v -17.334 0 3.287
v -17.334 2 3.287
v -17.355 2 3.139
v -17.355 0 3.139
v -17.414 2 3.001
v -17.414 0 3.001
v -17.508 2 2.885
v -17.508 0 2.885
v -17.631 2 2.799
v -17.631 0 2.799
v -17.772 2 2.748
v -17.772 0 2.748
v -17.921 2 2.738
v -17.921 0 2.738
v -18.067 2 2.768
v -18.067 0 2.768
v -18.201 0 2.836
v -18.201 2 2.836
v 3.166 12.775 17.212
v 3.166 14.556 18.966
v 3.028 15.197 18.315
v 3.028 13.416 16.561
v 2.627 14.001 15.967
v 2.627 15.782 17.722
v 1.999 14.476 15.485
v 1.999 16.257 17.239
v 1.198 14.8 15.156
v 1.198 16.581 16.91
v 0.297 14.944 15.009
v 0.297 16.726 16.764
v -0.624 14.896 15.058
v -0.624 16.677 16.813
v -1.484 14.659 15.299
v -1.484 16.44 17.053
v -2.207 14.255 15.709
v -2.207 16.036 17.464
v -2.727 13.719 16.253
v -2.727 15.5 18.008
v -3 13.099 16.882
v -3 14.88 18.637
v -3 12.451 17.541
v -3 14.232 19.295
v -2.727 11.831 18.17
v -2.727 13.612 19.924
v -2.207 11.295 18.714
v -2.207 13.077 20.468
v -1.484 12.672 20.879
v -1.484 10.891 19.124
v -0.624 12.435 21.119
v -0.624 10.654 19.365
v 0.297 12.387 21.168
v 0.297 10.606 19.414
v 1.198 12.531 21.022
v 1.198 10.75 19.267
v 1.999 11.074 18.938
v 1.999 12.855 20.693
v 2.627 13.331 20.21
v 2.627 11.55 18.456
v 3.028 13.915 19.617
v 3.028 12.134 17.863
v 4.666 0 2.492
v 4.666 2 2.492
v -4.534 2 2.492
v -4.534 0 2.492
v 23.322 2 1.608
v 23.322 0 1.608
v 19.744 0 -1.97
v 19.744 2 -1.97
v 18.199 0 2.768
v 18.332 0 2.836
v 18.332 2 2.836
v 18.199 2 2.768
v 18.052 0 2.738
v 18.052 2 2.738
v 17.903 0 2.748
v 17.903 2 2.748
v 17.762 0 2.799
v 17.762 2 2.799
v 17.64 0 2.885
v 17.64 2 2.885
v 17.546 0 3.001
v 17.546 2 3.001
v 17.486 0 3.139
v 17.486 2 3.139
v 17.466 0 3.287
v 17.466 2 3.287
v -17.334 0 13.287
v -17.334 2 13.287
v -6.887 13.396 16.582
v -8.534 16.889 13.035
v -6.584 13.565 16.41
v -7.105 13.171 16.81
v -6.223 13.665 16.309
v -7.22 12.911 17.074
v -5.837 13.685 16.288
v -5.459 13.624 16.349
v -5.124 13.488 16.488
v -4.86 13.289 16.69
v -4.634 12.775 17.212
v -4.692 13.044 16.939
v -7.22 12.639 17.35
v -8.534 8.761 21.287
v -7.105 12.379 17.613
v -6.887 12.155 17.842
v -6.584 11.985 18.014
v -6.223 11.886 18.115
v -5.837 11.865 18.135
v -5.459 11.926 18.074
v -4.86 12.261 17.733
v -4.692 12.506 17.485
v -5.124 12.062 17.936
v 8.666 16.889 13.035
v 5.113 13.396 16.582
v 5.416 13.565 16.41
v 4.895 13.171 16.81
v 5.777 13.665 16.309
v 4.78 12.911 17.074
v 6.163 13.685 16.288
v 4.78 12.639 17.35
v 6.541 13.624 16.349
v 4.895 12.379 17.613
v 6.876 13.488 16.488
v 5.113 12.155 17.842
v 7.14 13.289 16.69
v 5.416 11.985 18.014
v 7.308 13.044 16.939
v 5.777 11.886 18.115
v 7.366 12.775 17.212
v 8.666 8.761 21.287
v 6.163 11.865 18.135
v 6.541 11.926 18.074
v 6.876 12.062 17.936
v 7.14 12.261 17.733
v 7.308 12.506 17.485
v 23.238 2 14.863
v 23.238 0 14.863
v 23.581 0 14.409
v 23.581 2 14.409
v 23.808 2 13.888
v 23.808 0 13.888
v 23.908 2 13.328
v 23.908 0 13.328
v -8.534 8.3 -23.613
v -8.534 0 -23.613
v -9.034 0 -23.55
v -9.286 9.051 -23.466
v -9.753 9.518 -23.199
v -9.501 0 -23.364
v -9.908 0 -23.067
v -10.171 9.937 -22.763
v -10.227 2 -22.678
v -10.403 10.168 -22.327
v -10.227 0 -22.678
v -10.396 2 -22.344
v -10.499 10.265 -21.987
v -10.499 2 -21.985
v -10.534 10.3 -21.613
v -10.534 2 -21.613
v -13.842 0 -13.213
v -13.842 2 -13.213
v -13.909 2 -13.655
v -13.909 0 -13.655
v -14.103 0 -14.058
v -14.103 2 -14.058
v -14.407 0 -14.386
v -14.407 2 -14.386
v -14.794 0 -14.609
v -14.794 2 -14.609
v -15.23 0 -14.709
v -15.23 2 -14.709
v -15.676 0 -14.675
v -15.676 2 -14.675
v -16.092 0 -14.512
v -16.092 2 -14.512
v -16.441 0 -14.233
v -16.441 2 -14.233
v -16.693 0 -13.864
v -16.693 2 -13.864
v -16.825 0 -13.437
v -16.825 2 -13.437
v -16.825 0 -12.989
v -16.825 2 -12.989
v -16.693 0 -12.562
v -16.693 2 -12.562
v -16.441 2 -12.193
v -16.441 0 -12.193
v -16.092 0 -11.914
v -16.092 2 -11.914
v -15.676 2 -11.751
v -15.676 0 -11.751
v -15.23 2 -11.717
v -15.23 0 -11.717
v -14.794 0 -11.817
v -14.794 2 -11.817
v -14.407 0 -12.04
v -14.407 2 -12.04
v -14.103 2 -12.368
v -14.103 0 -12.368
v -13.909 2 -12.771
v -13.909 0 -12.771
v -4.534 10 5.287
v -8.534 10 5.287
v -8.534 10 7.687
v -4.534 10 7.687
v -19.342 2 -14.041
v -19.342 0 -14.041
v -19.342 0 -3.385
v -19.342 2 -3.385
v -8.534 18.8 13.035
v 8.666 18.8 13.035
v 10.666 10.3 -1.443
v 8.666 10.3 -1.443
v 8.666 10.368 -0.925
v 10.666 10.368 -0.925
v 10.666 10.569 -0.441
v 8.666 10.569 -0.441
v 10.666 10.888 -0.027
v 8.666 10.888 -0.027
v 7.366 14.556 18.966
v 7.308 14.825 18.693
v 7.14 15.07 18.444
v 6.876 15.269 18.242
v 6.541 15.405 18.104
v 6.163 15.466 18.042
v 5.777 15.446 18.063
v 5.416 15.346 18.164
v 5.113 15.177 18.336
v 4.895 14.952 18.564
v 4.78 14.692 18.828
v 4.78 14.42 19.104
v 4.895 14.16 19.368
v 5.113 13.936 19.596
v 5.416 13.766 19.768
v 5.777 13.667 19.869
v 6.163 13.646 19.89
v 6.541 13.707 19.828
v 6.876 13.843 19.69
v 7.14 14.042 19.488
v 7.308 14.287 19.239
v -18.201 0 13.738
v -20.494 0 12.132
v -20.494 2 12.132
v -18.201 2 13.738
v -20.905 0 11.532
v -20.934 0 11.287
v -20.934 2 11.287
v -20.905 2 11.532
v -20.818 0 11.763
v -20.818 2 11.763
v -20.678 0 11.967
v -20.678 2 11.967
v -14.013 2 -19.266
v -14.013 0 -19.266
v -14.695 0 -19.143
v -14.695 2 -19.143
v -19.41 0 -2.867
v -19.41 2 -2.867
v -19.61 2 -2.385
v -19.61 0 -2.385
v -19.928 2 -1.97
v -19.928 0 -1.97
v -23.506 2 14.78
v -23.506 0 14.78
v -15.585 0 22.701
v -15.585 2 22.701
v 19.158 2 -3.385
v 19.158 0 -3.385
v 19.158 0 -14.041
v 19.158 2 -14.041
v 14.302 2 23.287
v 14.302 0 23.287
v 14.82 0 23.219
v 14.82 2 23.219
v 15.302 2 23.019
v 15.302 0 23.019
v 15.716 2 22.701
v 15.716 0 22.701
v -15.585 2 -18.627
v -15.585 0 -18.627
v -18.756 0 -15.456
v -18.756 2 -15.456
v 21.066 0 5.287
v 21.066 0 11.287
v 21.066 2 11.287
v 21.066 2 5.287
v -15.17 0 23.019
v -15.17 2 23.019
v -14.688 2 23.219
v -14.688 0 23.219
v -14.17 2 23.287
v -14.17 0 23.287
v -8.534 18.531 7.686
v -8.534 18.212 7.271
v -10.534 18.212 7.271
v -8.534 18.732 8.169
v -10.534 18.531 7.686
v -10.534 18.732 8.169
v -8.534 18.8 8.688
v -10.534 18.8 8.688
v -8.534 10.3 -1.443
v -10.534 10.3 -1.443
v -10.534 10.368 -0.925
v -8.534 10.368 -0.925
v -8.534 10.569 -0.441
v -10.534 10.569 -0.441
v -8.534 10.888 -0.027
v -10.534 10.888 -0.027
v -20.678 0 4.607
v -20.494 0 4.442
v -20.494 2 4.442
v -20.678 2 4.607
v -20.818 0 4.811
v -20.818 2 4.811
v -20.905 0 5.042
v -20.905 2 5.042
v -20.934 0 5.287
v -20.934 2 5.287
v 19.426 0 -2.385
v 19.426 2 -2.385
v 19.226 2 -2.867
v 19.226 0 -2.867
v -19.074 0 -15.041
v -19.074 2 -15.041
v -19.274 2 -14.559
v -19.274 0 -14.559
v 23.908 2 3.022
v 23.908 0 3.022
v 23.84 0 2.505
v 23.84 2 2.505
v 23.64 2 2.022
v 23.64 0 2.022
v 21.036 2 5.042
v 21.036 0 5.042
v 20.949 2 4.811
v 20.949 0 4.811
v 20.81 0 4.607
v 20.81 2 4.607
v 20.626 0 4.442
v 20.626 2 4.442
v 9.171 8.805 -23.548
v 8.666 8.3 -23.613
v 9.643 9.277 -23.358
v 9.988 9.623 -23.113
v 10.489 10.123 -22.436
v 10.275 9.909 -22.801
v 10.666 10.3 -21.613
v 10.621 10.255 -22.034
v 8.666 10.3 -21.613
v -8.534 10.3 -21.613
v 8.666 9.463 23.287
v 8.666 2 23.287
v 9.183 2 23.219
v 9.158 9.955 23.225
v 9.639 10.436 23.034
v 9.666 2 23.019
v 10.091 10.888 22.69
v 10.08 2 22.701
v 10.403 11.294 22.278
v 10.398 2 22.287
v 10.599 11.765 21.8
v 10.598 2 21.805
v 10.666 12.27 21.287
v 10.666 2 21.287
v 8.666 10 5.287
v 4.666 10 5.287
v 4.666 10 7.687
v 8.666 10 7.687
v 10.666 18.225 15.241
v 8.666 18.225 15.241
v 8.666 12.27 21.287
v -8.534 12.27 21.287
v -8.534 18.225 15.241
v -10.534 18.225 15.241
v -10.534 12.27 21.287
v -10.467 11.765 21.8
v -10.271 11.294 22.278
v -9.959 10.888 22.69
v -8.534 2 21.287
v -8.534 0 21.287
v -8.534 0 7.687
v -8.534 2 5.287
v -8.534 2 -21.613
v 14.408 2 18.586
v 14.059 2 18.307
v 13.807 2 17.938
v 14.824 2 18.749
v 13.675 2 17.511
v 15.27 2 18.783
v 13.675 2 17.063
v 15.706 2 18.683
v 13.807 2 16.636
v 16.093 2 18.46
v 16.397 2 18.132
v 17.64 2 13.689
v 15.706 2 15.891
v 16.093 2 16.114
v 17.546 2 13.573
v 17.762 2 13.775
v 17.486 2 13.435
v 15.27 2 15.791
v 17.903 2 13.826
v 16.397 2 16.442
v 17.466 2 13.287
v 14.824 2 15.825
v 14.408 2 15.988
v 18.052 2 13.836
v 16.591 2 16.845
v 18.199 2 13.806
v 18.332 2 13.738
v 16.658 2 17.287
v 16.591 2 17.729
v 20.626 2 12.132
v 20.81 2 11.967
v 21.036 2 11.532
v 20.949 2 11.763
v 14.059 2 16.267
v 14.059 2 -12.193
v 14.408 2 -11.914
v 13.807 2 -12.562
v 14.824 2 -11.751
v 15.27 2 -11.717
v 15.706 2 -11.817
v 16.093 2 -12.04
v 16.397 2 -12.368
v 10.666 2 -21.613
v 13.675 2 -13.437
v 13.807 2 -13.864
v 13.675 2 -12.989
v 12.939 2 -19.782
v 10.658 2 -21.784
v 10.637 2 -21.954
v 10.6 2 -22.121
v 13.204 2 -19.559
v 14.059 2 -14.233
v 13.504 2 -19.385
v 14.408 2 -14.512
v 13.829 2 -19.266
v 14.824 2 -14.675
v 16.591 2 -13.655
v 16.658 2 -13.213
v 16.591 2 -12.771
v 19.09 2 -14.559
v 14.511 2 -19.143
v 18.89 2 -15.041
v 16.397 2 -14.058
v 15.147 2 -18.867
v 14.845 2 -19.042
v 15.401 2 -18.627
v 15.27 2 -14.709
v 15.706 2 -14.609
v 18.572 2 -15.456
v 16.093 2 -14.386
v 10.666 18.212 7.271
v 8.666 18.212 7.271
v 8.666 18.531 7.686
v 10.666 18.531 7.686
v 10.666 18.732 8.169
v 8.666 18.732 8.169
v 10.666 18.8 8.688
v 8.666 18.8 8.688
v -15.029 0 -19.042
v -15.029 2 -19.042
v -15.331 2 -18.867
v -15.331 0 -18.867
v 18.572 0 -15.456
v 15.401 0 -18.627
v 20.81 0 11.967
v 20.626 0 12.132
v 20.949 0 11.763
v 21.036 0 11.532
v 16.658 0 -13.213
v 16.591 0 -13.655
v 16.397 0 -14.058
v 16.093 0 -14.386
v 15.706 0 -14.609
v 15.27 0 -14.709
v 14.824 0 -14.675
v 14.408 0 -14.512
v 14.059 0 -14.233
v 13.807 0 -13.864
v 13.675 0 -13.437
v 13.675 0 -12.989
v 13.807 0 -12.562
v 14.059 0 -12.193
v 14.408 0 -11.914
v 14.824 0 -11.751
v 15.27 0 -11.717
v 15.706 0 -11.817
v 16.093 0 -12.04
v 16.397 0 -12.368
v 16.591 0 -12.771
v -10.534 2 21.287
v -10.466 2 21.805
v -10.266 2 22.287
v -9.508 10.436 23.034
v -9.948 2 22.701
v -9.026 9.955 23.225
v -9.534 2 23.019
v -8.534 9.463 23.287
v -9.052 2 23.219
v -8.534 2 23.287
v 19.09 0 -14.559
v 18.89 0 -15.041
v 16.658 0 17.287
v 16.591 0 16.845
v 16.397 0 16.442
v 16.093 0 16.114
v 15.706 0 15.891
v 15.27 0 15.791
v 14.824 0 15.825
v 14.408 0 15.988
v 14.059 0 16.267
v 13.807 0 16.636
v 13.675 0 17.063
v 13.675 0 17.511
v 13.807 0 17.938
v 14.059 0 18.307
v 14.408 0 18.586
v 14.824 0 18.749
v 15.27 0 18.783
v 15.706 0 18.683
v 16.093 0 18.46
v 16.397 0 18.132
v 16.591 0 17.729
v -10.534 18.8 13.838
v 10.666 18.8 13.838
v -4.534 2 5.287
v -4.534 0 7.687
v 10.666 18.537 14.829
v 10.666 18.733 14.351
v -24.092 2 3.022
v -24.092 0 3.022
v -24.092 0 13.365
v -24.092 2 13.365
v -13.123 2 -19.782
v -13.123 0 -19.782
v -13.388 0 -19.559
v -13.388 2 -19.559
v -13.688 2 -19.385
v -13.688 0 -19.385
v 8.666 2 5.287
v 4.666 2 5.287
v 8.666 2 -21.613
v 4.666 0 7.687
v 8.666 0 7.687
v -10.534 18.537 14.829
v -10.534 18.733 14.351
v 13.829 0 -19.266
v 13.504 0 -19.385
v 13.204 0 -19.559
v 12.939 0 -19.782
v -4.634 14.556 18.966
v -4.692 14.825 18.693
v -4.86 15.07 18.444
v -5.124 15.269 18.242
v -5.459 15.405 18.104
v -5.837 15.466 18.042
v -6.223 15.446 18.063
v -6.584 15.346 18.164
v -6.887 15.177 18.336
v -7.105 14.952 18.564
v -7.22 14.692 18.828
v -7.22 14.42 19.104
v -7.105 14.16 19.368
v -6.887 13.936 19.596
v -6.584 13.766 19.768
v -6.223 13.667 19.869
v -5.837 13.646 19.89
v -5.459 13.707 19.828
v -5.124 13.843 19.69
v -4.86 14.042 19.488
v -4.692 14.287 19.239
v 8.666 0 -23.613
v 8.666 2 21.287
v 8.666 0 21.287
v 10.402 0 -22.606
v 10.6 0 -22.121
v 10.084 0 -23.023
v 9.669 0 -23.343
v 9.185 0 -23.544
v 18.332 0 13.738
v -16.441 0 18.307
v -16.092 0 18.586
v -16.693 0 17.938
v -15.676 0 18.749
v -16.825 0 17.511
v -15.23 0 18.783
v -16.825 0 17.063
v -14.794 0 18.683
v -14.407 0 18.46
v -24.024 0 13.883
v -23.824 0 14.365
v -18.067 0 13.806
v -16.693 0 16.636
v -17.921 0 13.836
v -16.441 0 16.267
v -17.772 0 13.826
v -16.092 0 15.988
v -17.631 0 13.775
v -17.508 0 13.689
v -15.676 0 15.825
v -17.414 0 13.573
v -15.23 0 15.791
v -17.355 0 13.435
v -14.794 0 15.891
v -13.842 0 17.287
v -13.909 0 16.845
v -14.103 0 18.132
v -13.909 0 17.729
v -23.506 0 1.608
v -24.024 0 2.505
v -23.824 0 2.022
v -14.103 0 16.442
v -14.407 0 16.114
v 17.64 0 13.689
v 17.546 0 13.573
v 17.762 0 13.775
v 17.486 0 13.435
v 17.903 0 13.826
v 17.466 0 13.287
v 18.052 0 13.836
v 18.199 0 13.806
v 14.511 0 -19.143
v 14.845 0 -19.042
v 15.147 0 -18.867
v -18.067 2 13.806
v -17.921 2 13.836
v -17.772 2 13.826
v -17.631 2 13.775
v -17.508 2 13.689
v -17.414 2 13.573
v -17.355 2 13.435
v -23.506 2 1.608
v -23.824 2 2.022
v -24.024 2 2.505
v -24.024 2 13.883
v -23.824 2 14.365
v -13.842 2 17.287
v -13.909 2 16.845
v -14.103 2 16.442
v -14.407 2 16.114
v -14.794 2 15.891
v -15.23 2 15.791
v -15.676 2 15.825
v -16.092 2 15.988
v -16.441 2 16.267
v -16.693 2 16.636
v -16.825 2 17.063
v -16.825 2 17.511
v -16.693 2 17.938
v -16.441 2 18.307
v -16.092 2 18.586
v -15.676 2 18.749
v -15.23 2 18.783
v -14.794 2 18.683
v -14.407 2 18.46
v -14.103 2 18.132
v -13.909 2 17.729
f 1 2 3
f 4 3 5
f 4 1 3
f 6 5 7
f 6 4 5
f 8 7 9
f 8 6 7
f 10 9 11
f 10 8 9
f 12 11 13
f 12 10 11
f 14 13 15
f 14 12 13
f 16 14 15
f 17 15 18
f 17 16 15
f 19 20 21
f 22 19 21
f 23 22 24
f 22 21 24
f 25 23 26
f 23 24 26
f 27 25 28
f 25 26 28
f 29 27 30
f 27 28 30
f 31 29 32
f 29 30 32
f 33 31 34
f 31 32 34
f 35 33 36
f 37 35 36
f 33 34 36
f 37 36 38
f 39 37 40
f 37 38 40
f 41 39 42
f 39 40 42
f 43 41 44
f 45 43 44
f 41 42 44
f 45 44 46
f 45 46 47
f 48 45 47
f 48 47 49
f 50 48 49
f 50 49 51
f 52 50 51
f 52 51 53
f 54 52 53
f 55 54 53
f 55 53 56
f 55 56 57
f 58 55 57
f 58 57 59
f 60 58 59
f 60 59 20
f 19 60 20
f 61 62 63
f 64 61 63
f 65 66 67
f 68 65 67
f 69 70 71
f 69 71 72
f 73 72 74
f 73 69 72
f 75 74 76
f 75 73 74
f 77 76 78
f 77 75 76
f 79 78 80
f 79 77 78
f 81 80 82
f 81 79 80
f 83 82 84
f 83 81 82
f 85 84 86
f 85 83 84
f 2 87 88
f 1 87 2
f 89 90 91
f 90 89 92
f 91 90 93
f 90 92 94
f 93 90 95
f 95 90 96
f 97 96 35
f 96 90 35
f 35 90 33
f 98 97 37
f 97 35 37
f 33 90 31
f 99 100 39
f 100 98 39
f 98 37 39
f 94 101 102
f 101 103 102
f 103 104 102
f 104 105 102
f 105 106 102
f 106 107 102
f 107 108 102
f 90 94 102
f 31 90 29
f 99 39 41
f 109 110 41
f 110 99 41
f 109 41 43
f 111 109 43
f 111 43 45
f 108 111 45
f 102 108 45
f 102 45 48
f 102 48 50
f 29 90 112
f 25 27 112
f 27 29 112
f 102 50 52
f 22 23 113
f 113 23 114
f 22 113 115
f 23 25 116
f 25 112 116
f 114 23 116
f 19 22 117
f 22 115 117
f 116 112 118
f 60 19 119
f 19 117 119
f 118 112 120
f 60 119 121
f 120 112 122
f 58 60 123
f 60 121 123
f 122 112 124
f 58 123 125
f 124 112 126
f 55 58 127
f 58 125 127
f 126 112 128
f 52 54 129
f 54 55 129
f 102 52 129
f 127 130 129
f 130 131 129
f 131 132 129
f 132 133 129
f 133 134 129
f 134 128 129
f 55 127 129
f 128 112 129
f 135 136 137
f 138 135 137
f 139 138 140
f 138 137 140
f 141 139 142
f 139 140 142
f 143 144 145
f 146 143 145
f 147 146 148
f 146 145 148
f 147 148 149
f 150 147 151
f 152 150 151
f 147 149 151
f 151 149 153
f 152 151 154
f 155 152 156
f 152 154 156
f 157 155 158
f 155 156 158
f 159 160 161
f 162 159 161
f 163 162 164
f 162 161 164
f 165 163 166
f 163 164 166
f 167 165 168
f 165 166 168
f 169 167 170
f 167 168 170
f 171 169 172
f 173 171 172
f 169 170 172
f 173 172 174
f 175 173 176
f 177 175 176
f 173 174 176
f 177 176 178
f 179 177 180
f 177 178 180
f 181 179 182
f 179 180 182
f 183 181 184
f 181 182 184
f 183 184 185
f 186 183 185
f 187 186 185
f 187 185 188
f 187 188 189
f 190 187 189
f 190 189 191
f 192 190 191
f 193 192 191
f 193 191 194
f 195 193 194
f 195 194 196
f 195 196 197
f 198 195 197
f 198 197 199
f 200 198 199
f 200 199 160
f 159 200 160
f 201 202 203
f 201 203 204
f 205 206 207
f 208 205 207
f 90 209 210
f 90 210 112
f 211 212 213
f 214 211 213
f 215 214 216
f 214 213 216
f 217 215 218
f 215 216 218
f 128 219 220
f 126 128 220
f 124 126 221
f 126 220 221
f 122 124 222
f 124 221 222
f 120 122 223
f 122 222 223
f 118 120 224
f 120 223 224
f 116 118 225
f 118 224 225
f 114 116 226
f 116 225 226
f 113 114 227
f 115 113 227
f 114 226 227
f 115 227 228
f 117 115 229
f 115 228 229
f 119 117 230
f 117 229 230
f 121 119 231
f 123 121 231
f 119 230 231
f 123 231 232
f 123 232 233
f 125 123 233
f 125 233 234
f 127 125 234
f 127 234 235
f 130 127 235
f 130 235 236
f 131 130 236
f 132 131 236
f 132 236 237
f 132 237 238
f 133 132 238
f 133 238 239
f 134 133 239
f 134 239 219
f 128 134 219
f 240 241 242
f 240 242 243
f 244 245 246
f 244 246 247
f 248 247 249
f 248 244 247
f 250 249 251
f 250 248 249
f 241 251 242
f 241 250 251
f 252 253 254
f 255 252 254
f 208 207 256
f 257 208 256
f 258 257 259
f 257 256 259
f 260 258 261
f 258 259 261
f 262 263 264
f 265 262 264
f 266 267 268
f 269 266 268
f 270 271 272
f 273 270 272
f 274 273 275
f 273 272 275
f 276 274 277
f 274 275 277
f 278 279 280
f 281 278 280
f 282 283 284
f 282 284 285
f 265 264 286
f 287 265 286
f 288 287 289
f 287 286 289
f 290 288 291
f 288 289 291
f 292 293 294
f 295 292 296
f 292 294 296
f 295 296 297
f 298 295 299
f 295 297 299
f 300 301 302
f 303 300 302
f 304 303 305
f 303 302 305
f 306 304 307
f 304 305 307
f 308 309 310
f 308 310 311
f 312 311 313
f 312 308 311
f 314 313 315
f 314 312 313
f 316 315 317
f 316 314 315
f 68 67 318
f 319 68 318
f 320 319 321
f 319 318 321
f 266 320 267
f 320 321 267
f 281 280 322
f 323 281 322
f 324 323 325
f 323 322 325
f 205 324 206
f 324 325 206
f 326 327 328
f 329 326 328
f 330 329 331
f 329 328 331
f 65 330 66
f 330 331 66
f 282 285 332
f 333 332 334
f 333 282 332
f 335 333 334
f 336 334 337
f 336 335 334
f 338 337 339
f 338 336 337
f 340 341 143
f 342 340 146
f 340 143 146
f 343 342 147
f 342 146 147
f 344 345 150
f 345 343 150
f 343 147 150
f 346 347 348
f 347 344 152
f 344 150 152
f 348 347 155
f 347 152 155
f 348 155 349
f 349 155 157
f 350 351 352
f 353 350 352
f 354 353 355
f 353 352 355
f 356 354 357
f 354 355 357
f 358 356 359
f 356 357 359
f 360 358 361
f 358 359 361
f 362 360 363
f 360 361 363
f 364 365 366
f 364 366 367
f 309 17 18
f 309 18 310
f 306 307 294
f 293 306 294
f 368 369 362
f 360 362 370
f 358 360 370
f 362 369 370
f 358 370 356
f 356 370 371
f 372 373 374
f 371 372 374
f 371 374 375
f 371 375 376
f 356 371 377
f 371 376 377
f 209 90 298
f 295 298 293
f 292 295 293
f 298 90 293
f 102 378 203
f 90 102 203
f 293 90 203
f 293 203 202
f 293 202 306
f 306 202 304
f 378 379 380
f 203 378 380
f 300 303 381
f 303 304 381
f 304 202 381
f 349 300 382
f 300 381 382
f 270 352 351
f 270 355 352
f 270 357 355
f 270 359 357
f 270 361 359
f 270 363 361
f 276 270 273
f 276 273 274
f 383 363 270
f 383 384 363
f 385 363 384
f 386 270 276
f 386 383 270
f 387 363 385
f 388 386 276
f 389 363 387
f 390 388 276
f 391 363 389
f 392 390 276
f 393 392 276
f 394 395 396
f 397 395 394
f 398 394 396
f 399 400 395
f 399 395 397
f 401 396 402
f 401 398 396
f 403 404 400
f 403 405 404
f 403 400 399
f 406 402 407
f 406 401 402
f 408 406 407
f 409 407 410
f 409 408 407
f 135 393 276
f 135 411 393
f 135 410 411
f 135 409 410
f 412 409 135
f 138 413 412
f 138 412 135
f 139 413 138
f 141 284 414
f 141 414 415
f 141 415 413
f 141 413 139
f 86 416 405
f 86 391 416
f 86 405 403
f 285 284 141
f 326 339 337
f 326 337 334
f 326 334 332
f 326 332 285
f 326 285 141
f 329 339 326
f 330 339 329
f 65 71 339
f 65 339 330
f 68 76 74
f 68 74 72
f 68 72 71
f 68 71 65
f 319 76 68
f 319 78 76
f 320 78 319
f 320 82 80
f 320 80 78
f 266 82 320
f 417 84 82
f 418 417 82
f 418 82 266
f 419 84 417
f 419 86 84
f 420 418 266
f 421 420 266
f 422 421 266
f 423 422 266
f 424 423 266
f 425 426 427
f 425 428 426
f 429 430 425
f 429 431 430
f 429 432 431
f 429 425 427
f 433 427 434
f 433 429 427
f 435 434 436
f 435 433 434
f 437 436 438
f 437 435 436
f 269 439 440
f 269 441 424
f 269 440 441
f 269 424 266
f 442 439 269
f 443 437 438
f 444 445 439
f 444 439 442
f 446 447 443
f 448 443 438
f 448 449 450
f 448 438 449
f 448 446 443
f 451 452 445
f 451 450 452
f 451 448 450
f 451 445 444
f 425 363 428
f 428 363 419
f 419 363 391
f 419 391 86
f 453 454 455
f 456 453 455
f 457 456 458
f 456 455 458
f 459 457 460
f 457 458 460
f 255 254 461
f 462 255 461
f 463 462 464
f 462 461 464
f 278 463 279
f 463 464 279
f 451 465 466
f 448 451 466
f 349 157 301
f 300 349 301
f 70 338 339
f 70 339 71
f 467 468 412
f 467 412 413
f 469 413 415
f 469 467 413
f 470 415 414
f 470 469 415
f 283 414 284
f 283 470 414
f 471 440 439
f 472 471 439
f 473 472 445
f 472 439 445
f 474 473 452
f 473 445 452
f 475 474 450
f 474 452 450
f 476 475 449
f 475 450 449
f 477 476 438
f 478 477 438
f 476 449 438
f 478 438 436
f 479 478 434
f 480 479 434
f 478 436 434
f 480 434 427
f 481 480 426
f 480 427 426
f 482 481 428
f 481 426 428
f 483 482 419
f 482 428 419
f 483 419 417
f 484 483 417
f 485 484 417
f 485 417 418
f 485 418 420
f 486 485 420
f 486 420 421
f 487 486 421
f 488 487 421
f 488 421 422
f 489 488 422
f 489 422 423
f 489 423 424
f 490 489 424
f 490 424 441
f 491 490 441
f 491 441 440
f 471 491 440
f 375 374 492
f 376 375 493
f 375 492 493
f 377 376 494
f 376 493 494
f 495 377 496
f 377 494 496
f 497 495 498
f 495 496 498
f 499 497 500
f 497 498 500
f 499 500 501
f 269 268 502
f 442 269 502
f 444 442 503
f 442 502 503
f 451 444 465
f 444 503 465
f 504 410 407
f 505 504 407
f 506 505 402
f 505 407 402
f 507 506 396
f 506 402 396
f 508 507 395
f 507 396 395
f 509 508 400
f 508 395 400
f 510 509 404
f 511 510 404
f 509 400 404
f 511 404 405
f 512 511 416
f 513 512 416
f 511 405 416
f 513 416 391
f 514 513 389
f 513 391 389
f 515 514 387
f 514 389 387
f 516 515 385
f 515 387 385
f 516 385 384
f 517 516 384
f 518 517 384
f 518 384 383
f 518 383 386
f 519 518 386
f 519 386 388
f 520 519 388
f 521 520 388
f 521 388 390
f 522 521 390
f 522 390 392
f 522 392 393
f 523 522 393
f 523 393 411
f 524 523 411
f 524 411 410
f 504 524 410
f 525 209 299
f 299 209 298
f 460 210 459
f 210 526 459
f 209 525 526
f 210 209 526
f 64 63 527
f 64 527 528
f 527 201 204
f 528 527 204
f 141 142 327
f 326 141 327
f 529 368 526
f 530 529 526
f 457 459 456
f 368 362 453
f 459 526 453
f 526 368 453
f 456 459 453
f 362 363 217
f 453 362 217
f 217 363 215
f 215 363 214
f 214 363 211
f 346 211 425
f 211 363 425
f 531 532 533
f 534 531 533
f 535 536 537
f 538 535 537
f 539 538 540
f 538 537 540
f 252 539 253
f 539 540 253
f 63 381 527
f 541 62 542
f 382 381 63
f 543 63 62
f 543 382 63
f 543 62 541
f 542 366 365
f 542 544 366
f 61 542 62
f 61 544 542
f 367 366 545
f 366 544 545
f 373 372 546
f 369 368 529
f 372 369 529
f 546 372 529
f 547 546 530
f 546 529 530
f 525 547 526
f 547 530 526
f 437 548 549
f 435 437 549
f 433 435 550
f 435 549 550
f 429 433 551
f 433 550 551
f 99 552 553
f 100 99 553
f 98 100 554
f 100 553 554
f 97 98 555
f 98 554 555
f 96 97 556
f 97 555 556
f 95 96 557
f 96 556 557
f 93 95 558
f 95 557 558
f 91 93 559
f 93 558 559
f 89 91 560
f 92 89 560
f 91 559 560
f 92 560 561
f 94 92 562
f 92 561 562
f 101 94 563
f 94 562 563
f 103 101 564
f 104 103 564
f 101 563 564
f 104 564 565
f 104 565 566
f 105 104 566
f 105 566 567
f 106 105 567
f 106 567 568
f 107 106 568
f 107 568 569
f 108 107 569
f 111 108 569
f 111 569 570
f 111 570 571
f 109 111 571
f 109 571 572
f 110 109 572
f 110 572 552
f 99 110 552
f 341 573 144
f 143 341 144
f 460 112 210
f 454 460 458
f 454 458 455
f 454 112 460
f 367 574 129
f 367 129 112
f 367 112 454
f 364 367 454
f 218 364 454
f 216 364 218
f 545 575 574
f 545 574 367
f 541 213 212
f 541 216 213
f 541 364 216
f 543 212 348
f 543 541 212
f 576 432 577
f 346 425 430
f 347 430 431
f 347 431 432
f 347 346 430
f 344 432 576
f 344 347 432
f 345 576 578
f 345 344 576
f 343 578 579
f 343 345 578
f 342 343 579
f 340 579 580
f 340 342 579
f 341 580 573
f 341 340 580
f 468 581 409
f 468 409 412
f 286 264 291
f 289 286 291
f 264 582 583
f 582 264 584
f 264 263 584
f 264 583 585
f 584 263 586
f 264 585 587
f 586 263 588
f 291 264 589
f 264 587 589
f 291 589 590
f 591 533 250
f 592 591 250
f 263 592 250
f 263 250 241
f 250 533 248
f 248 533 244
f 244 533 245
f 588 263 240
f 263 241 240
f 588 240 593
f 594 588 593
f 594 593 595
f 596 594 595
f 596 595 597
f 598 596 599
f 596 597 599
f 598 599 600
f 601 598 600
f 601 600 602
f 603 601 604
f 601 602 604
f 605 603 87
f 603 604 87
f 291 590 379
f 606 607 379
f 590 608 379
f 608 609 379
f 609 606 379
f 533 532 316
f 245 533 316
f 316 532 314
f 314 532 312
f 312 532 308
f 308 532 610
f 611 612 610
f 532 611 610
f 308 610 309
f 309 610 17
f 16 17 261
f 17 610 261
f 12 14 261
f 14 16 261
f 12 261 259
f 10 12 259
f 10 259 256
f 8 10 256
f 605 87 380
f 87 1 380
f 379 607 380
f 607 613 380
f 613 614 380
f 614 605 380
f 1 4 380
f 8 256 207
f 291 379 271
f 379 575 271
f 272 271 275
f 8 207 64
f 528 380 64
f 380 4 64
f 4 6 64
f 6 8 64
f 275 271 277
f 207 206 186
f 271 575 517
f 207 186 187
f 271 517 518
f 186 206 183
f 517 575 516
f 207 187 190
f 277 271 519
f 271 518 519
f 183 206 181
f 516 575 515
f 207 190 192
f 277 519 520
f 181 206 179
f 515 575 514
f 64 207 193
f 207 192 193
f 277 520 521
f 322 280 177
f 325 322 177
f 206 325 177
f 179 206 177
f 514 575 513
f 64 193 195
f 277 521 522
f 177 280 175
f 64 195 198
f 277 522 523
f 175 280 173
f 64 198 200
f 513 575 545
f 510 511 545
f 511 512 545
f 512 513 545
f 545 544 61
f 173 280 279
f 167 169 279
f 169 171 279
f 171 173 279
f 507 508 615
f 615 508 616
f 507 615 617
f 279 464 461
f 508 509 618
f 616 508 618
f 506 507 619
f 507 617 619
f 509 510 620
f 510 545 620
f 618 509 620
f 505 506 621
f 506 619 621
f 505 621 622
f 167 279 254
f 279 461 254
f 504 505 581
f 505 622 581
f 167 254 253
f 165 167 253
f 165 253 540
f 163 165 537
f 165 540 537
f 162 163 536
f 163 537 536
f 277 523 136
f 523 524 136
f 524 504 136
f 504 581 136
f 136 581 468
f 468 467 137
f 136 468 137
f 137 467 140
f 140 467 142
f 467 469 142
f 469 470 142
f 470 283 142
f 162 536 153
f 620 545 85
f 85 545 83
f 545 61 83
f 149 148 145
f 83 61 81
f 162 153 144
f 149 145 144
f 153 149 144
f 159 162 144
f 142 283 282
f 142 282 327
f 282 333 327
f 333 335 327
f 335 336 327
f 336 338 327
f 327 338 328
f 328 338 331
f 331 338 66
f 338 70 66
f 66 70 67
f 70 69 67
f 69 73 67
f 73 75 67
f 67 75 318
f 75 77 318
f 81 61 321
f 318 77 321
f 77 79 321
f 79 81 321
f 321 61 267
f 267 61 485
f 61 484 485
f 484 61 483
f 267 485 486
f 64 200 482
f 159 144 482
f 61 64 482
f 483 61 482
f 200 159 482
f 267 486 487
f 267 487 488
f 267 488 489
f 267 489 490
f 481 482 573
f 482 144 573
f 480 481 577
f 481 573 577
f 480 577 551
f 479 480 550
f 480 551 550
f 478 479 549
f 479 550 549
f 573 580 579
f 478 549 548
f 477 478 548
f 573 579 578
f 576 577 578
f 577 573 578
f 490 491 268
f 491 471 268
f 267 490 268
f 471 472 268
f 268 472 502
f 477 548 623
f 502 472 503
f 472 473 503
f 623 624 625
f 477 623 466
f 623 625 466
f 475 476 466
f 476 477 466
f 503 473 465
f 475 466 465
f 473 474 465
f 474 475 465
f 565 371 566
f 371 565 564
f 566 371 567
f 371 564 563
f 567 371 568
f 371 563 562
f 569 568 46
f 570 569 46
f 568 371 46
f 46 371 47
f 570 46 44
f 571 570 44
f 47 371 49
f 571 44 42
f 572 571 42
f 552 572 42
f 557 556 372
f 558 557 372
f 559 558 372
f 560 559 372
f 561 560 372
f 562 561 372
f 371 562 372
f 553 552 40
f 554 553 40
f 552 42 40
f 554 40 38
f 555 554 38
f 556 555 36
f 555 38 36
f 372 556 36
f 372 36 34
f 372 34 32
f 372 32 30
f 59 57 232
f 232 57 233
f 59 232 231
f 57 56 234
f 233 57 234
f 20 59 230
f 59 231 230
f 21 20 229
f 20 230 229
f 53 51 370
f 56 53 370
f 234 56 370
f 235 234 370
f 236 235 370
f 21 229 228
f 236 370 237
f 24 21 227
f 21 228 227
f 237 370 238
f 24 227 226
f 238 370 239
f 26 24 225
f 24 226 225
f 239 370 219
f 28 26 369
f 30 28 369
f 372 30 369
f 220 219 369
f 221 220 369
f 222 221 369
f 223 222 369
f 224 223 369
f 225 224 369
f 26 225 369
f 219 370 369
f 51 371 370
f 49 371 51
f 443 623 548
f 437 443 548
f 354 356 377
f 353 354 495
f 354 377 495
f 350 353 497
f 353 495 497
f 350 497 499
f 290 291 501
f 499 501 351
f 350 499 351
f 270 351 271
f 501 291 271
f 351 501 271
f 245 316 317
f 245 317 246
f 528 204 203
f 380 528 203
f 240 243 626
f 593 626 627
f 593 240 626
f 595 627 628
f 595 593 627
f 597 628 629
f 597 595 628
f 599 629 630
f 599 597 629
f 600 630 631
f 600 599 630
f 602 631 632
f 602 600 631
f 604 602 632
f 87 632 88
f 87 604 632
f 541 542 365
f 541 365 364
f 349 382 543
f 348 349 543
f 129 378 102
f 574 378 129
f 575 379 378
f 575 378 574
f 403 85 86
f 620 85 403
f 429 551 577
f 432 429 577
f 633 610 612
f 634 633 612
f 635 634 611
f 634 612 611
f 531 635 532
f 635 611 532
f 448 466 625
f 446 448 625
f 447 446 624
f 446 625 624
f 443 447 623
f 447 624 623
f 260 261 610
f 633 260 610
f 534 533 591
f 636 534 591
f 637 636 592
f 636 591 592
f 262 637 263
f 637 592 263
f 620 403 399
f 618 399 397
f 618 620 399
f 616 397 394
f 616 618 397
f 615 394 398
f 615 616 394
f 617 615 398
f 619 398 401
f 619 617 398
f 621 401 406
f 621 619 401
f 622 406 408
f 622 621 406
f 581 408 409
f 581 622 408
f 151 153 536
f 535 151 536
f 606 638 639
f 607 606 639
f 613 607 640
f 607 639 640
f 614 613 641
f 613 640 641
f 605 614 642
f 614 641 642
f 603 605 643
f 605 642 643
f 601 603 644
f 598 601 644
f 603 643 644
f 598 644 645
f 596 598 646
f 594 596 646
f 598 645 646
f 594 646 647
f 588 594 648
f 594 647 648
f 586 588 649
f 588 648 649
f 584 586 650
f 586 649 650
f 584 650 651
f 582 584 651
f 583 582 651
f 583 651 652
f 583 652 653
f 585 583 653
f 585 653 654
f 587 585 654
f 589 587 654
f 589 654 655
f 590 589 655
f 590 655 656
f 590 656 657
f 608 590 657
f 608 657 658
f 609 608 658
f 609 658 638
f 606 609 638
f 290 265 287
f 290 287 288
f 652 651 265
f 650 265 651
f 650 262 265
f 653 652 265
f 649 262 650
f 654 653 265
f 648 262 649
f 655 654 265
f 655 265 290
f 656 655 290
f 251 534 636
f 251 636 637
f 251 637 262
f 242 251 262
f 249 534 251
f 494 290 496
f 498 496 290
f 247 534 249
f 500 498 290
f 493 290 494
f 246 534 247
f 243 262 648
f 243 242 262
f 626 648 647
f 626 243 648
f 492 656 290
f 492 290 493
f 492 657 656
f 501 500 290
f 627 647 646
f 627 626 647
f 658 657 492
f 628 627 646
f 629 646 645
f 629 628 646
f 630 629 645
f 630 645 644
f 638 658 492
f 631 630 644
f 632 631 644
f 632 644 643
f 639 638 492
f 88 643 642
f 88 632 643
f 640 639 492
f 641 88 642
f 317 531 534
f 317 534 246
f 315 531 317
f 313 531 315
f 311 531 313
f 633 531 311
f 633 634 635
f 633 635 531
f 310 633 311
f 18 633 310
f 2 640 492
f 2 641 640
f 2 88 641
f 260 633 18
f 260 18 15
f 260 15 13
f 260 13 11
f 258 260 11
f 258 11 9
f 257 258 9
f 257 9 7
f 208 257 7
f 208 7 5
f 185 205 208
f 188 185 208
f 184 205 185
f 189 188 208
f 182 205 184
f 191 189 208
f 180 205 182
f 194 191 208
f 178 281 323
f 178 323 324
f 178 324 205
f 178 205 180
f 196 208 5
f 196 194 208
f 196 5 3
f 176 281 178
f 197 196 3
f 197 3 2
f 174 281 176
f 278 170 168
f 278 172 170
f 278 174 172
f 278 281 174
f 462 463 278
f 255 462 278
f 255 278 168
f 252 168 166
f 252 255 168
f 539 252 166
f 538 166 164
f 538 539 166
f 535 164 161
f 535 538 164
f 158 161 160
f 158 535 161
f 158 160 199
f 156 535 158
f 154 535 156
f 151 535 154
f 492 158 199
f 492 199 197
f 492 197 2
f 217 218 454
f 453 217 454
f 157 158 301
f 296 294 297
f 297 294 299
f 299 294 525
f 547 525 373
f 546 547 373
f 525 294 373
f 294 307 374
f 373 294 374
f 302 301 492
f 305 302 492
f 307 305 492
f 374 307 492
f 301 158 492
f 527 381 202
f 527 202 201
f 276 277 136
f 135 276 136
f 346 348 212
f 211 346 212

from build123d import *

# Parameters (mm, degrees)
BOSS_EXTRUDE1_DEPTH      = 2
SKETCH2_R                = 1.500000246
SKETCH2_R_2              = 1.5
CUT_EXTRUDE1_DEPTH       = 3
CUT_EXTRUDE3_DEPTH       = 3
SKETCH4_W                = 17.2
SKETCH4_H                = 42.900000423
BOSS_EXTRUDE2_DEPTH      = 16.8
BOSS_EXTRUDE2_DEPTH_BACK = 2
CUT_EXTRUDE4_DEPTH       = 35.442318281
BOSS_EXTRUDE3_REACH      = 34.758
CUT_EXTRUDE5_REACH       = 42.25
SKETCH7_R                = 3.1
SKETCH7_R_2              = 1.3
CUT_EXTRUDE6_REACH       = 4
SKETCH10_W               = 4
SKETCH10_H               = 2.4
BOSS_EXTRUDE4_DEPTH      = 8


with BuildPart() as part:
    # Sketch1 → Boss-Extrude1 (new body)
    with BuildSketch(Plane(origin=(0, 0, 0), x_dir=(1, 0, 0), z_dir=(0, 1, 0))):
        with BuildLine():
            Line((18.572356392, 15.455642083), (15.400781136, 18.627215476))
            ThreePointArc((15.400781136, 18.627215476), (15.000980559, 18.963075341), (14.510830812, 19.14306305))
            Line((14.510830812, 19.14306305), (13.829154841, 19.266075861))
            ThreePointArc((13.829154841, 19.266075861), (13.350450837, 19.465809152), (12.939209066, 19.781927984))
            Line((12.939209066, 19.781927984), (9.538270081, 23.182866969))
            ThreePointArc((9.538270081, 23.182866969), (9.061835297, 23.501210514), (8.499842151, 23.612997901))
            Line((8.499842151, 23.612997901), (-8.368205994, 23.612997901))
            ThreePointArc((-8.368205994, 23.612997901), (-9.221556491, 23.443255933), (-9.94499211, 22.959871707))
            Line((-9.94499211, 22.959871707), (-13.122935832, 19.781927984))
            ThreePointArc((-13.122935832, 19.781927984), (-13.53417801, 19.465808988), (-14.012882539, 19.266075861))
            Line((-14.012882539, 19.266075861), (-14.694557578, 19.14306305))
            ThreePointArc((-14.694557578, 19.14306305), (-15.184706626, 18.963073976), (-15.584504285, 18.627210927))
            Line((-15.584504285, 18.627210927), (-18.756076746, 15.455636602))
            ThreePointArc((-18.756076746, 15.455636602), (-19.189622668, 14.806788967), (-19.341863745, 14.041421099))
            Line((-19.341863745, 14.041421099), (-19.341863745, 3.384570997))
            ThreePointArc((-19.341863745, 3.384570997), (-19.494104434, 2.619205106), (-19.927649253, 1.970359158))
            Line((-19.927649253, 1.970359158), (-23.506077059, -1.608070511))
            ThreePointArc((-23.506077059, -1.608070511), (-23.939622981, -2.25691811), (-24.091864058, -3.022285948))
            Line((-24.091864058, -3.022285948), (-24.091864058, -13.36542942))
            ThreePointArc((-24.091864058, -13.36542942), (-23.939623268, -14.130795551), (-23.506078181, -14.779641628))
            Line((-23.506078181, -14.779641628), (-15.584504285, -22.701215524))
            ThreePointArc((-15.584504285, -22.701215524), (-14.935656966, -23.134761442), (-14.170289369, -23.287002522))
            Line((-14.170289369, -23.287002522), (14.301925526, -23.287002522))
            ThreePointArc((14.301925526, -23.287002522), (15.067293123, -23.134761442), (15.716140442, -22.701215524))
            Line((15.716140442, -22.701215524), (23.23794041, -14.862959876))
            ThreePointArc((23.23794041, -14.862959876), (23.709924747, -14.155388537), (23.90813636, -13.32826184))
            Line((23.90813636, -13.32826184), (23.90813636, -3.022286468))
            ThreePointArc((23.90813636, -3.022286468), (23.755895287, -2.25691839), (23.322349361, -1.608070511))
            Line((23.322349361, -1.608070511), (19.743924908, 1.970357668))
            ThreePointArc((19.743924908, 1.970357668), (19.310378982, 2.619205547), (19.158137909, 3.384573625))
            Line((19.158137909, 3.384573625), (19.158137909, 14.041440986))
            ThreePointArc((19.158137909, 14.041440986), (19.005898249, 14.806801151), (18.572356392, 15.455642083))
        make_face()
    extrude(amount=BOSS_EXTRUDE1_DEPTH)

    # Sketch2 → Cut-Extrude1 (cut, through all)
    with BuildSketch(Plane(origin=(0, 2, 0), x_dir=(1, 0, 0), z_dir=(0, 1, 0))):
        with Locations((-15.341864952, -17.28700247)):
            Circle(SKETCH2_R)
        with Locations((15.158137254, -17.28700247)):
            Circle(SKETCH2_R)
        with Locations((15.158137909, 13.212998804)):
            Circle(SKETCH2_R_2)
        with Locations((-15.341866539, 13.212998804)):
            Circle(SKETCH2_R_2)
    extrude(amount=-CUT_EXTRUDE1_DEPTH, mode=Mode.SUBTRACT)

    # Sketch3 → Cut-Extrude3 (cut, through all)
    with BuildSketch(Plane.XZ):
        with BuildLine():
            Line((18.332290758, 13.738059649), (20.625916482, 12.132045627))
            ThreePointArc((20.625916482, 12.132045627), (20.949257646, 11.763345693), (21.065818079, 11.287002522))
            Line((21.065818079, 11.287002522), (21.065818079, 5.287002522))
            ThreePointArc((21.065818079, 5.287002522), (20.949257646, 4.810659352), (20.625916482, 4.441959417))
            Line((20.625916482, 4.441959417), (18.332290758, 2.835945395))
            ThreePointArc((18.332290758, 2.835945395), (17.762200326, 2.798579694), (17.465818079, 3.287002522))
            Line((17.465818079, 3.287002522), (17.465818079, 13.287002522))
            ThreePointArc((17.465818079, 13.287002522), (17.762200326, 13.77542535), (18.332290758, 13.738059649))
        make_face()
        with BuildLine():
            Line((-17.334181921, 13.287002522), (-17.334181921, 3.287002522))
            ThreePointArc((-17.334181921, 3.287002522), (-17.630564169, 2.798579694), (-18.200654601, 2.835945395))
            Line((-18.200654601, 2.835945395), (-20.494280325, 4.441959417))
            ThreePointArc((-20.494280325, 4.441959417), (-20.817621489, 4.810659352), (-20.934181921, 5.287002522))
            Line((-20.934181921, 5.287002522), (-20.934181921, 11.287002522))
            ThreePointArc((-20.934181921, 11.287002522), (-20.817621489, 11.763345693), (-20.494280325, 12.132045627))
            Line((-20.494280325, 12.132045627), (-18.200654601, 13.738059649))
            ThreePointArc((-18.200654601, 13.738059649), (-17.630564169, 13.77542535), (-17.334181921, 13.287002522))
        make_face()
    extrude(amount=-CUT_EXTRUDE3_DEPTH, mode=Mode.SUBTRACT)

    # Sketch4 → Boss-Extrude2 (add, two sides)
    with BuildSketch(Plane(origin=(0, 2, 0), x_dir=(1, 0, 0), z_dir=(0, 1, 0))) as boss_extrude2_sk:
        with BuildLine():
            Line((-8.534181921, -23.287002522), (8.665818079, -23.287002522))
            ThreePointArc((8.665818079, -23.287002522), (10.080031641, -22.701216085), (10.665818079, -21.287002522))
            Line((10.665818079, -21.287002522), (10.665818079, 21.612997901))
            ThreePointArc((10.665818079, 21.612997901), (10.080031641, 23.027211463), (8.665818079, 23.612997901))
            Line((8.665818079, 23.612997901), (-8.534181921, 23.612997901))
            ThreePointArc((-8.534181921, 23.612997901), (-9.948395484, 23.027211463), (-10.534181921, 21.612997901))
            Line((-10.534181921, 21.612997901), (-10.534181921, -21.287002522))
            ThreePointArc((-10.534181921, -21.287002522), (-9.948395484, -22.701216085), (-8.534181921, -23.287002522))
        make_face()
        with Locations((0.065818079, 0.162997689)):
            Rectangle(SKETCH4_W, SKETCH4_H, mode=Mode.SUBTRACT)
    extrude(amount=BOSS_EXTRUDE2_DEPTH)
    extrude(boss_extrude2_sk.sketch, amount=-BOSS_EXTRUDE2_DEPTH_BACK)

    # Sketch5 → Cut-Extrude4 (cut, through all)
    with BuildSketch(Plane.ZY.offset(10.534181921)):
        with BuildLine():
            Line((-21.612997901, 10.3), (-1.443459743, 10.3))
            ThreePointArc((-1.443459743, 10.3), (-0.676489206, 10.452906013), (-0.026793076, 10.888243804))
            Line((-0.026793076, 10.888243804), (7.271334447, 18.211756196))
            ThreePointArc((7.271334447, 18.211756196), (7.921030577, 18.647093987), (8.688001114, 18.8))
            Line((8.688001114, 18.8), (13.837952846, 18.8))
            ThreePointArc((13.837952846, 18.8), (14.596331781, 18.650638104), (15.2414378, 18.224861392))
            Line((15.2414378, 18.224861392), (22.690487476, 10.887565848))
            ThreePointArc((22.690487476, 10.887565848), (23.131856162, 10.235048322), (23.287002522, 9.462704457))
            Line((23.287002522, 9.462704457), (23.287002522, 6.883402598))
            Line((23.287002522, 6.883402598), (26.098263888, 6.883402598))
            Line((26.098263888, 6.883402598), (26.098263888, 23.771252442))
            Line((26.098263888, 23.771252442), (-26.157105029, 23.771252442))
            Line((-26.157105029, 23.771252442), (-26.157105029, 6.5400194))
            Line((-26.157105029, 6.5400194), (-23.612997901, 6.5400194))
            Line((-23.612997901, 6.5400194), (-23.612997901, 8.3))
            ThreePointArc((-23.612997901, 8.3), (-23.027211463, 9.714213562), (-21.612997901, 10.3))
        make_face()
    extrude(amount=-CUT_EXTRUDE4_DEPTH, mode=Mode.SUBTRACT)

    # Sketch6 → Boss-Extrude3 (add, up to next)
    with BuildSketch(Plane.ZY.offset(-8.665818079), mode=Mode.PRIVATE) as boss_extrude3_sk1:
        with BuildLine():
            Line((21.287002522, 12.269995063), (15.2414378, 18.224861392))
            ThreePointArc((15.2414378, 18.224861392), (14.596331781, 18.650638104), (13.837952846, 18.8))
            Line((13.837952846, 18.8), (13.034792435, 18.8))
            Line((13.034792435, 18.8), (13.034792435, 16.889288371))
            Line((13.034792435, 16.889288371), (21.313555812, 8.73472688))
            Line((21.313555812, 8.73472688), (23.287002522, 8.73472688))
            Line((23.287002522, 8.73472688), (23.287002522, 9.462704457))
            ThreePointArc((23.287002522, 9.462704457), (23.131856162, 10.235048322), (22.690487476, 10.887565848))
            Line((22.690487476, 10.887565848), (21.287002522, 12.269995063))
        make_face()
    boss_extrude3_tool1 = extrude(boss_extrude3_sk1.sketch, amount=BOSS_EXTRUDE3_REACH, mode=Mode.PRIVATE) - part.part
    add(boss_extrude3_tool1.solids().sort_by_distance((8.665818, 13.686528, 18.07587))[0])

    # Sketch7 → Cut-Extrude5 (cut, up to next)
    with BuildSketch(Plane(origin=(0, 16.870013343, 16.6169215), x_dir=(1, 0, 0), z_dir=(0, 0.712430696, 0.701742477)), mode=Mode.PRIVATE) as cut_extrude5_sk1:
        with Locations((0.065818079, -3.297220561)):
            Circle(SKETCH7_R)
    cut_extrude5_tool1 = extrude(cut_extrude5_sk1.sketch, amount=-CUT_EXTRUDE5_REACH, mode=Mode.PRIVATE) & part.part
    add(cut_extrude5_tool1.solids().sort_by_distance((0.065818, 14.556214, 18.965963))[0], mode=Mode.SUBTRACT)
    # Sketch7 → Cut-Extrude5 (cut, up to next)
    with BuildSketch(Plane(origin=(0, 16.870013343, 16.6169215), x_dir=(1, 0, 0), z_dir=(0, 0.712430696, 0.701742477)), mode=Mode.PRIVATE) as cut_extrude5_sk2:
        with Locations((6.065818079, -3.297220561)):
            Circle(SKETCH7_R_2)
    cut_extrude5_tool2 = extrude(cut_extrude5_sk2.sketch, amount=-CUT_EXTRUDE5_REACH, mode=Mode.PRIVATE) & part.part
    add(cut_extrude5_tool2.solids().sort_by_distance((6.065818, 14.556214, 18.965963))[0], mode=Mode.SUBTRACT)
    # Sketch7 → Cut-Extrude5 (cut, up to next)
    with BuildSketch(Plane(origin=(0, 16.870013343, 16.6169215), x_dir=(1, 0, 0), z_dir=(0, 0.712430696, 0.701742477)), mode=Mode.PRIVATE) as cut_extrude5_sk3:
        with Locations((-5.934181921, -3.297220561)):
            Circle(SKETCH7_R_2)
    cut_extrude5_tool3 = extrude(cut_extrude5_sk3.sketch, amount=-CUT_EXTRUDE5_REACH, mode=Mode.PRIVATE) & part.part
    add(cut_extrude5_tool3.solids().sort_by_distance((-5.934182, 14.556214, 18.965963))[0], mode=Mode.SUBTRACT)

    # Sketch9 → Cut-Extrude6 (cut, up to next)
    with BuildSketch(Plane(origin=(0, 2, 0), x_dir=(1, 0, 0), z_dir=(0, 1, 0)), mode=Mode.PRIVATE) as cut_extrude6_sk1:
        Polygon((-8.534181921, -21.287002522), (8.665818079, -21.287002522), (8.665818079, -7.687002522), (4.665818079, -7.687002522), (4.665818079, -2.492093964), (-4.534181921, -2.492093964), (-4.534181921, -7.687002522), (-8.534181921, -7.687002522), align=None)
    cut_extrude6_tool1 = extrude(cut_extrude6_sk1.sketch, amount=-CUT_EXTRUDE6_REACH, mode=Mode.PRIVATE) & part.part
    add(cut_extrude6_tool1.solids().sort_by_distance((0.065818, 2, 12.892707))[0], mode=Mode.SUBTRACT)

    # Sketch10 → Boss-Extrude4 (add)
    with BuildSketch(Plane(origin=(0, 2, 0), x_dir=(1, 0, 0), z_dir=(0, 1, 0))):
        with Locations((6.665818079, -6.487002522)):
            Rectangle(SKETCH10_W, SKETCH10_H)
        with Locations((-6.534181921, -6.487002522)):
            Rectangle(SKETCH10_W, SKETCH10_H)
    extrude(amount=BOSS_EXTRUDE4_DEPTH)


solid = part.part
